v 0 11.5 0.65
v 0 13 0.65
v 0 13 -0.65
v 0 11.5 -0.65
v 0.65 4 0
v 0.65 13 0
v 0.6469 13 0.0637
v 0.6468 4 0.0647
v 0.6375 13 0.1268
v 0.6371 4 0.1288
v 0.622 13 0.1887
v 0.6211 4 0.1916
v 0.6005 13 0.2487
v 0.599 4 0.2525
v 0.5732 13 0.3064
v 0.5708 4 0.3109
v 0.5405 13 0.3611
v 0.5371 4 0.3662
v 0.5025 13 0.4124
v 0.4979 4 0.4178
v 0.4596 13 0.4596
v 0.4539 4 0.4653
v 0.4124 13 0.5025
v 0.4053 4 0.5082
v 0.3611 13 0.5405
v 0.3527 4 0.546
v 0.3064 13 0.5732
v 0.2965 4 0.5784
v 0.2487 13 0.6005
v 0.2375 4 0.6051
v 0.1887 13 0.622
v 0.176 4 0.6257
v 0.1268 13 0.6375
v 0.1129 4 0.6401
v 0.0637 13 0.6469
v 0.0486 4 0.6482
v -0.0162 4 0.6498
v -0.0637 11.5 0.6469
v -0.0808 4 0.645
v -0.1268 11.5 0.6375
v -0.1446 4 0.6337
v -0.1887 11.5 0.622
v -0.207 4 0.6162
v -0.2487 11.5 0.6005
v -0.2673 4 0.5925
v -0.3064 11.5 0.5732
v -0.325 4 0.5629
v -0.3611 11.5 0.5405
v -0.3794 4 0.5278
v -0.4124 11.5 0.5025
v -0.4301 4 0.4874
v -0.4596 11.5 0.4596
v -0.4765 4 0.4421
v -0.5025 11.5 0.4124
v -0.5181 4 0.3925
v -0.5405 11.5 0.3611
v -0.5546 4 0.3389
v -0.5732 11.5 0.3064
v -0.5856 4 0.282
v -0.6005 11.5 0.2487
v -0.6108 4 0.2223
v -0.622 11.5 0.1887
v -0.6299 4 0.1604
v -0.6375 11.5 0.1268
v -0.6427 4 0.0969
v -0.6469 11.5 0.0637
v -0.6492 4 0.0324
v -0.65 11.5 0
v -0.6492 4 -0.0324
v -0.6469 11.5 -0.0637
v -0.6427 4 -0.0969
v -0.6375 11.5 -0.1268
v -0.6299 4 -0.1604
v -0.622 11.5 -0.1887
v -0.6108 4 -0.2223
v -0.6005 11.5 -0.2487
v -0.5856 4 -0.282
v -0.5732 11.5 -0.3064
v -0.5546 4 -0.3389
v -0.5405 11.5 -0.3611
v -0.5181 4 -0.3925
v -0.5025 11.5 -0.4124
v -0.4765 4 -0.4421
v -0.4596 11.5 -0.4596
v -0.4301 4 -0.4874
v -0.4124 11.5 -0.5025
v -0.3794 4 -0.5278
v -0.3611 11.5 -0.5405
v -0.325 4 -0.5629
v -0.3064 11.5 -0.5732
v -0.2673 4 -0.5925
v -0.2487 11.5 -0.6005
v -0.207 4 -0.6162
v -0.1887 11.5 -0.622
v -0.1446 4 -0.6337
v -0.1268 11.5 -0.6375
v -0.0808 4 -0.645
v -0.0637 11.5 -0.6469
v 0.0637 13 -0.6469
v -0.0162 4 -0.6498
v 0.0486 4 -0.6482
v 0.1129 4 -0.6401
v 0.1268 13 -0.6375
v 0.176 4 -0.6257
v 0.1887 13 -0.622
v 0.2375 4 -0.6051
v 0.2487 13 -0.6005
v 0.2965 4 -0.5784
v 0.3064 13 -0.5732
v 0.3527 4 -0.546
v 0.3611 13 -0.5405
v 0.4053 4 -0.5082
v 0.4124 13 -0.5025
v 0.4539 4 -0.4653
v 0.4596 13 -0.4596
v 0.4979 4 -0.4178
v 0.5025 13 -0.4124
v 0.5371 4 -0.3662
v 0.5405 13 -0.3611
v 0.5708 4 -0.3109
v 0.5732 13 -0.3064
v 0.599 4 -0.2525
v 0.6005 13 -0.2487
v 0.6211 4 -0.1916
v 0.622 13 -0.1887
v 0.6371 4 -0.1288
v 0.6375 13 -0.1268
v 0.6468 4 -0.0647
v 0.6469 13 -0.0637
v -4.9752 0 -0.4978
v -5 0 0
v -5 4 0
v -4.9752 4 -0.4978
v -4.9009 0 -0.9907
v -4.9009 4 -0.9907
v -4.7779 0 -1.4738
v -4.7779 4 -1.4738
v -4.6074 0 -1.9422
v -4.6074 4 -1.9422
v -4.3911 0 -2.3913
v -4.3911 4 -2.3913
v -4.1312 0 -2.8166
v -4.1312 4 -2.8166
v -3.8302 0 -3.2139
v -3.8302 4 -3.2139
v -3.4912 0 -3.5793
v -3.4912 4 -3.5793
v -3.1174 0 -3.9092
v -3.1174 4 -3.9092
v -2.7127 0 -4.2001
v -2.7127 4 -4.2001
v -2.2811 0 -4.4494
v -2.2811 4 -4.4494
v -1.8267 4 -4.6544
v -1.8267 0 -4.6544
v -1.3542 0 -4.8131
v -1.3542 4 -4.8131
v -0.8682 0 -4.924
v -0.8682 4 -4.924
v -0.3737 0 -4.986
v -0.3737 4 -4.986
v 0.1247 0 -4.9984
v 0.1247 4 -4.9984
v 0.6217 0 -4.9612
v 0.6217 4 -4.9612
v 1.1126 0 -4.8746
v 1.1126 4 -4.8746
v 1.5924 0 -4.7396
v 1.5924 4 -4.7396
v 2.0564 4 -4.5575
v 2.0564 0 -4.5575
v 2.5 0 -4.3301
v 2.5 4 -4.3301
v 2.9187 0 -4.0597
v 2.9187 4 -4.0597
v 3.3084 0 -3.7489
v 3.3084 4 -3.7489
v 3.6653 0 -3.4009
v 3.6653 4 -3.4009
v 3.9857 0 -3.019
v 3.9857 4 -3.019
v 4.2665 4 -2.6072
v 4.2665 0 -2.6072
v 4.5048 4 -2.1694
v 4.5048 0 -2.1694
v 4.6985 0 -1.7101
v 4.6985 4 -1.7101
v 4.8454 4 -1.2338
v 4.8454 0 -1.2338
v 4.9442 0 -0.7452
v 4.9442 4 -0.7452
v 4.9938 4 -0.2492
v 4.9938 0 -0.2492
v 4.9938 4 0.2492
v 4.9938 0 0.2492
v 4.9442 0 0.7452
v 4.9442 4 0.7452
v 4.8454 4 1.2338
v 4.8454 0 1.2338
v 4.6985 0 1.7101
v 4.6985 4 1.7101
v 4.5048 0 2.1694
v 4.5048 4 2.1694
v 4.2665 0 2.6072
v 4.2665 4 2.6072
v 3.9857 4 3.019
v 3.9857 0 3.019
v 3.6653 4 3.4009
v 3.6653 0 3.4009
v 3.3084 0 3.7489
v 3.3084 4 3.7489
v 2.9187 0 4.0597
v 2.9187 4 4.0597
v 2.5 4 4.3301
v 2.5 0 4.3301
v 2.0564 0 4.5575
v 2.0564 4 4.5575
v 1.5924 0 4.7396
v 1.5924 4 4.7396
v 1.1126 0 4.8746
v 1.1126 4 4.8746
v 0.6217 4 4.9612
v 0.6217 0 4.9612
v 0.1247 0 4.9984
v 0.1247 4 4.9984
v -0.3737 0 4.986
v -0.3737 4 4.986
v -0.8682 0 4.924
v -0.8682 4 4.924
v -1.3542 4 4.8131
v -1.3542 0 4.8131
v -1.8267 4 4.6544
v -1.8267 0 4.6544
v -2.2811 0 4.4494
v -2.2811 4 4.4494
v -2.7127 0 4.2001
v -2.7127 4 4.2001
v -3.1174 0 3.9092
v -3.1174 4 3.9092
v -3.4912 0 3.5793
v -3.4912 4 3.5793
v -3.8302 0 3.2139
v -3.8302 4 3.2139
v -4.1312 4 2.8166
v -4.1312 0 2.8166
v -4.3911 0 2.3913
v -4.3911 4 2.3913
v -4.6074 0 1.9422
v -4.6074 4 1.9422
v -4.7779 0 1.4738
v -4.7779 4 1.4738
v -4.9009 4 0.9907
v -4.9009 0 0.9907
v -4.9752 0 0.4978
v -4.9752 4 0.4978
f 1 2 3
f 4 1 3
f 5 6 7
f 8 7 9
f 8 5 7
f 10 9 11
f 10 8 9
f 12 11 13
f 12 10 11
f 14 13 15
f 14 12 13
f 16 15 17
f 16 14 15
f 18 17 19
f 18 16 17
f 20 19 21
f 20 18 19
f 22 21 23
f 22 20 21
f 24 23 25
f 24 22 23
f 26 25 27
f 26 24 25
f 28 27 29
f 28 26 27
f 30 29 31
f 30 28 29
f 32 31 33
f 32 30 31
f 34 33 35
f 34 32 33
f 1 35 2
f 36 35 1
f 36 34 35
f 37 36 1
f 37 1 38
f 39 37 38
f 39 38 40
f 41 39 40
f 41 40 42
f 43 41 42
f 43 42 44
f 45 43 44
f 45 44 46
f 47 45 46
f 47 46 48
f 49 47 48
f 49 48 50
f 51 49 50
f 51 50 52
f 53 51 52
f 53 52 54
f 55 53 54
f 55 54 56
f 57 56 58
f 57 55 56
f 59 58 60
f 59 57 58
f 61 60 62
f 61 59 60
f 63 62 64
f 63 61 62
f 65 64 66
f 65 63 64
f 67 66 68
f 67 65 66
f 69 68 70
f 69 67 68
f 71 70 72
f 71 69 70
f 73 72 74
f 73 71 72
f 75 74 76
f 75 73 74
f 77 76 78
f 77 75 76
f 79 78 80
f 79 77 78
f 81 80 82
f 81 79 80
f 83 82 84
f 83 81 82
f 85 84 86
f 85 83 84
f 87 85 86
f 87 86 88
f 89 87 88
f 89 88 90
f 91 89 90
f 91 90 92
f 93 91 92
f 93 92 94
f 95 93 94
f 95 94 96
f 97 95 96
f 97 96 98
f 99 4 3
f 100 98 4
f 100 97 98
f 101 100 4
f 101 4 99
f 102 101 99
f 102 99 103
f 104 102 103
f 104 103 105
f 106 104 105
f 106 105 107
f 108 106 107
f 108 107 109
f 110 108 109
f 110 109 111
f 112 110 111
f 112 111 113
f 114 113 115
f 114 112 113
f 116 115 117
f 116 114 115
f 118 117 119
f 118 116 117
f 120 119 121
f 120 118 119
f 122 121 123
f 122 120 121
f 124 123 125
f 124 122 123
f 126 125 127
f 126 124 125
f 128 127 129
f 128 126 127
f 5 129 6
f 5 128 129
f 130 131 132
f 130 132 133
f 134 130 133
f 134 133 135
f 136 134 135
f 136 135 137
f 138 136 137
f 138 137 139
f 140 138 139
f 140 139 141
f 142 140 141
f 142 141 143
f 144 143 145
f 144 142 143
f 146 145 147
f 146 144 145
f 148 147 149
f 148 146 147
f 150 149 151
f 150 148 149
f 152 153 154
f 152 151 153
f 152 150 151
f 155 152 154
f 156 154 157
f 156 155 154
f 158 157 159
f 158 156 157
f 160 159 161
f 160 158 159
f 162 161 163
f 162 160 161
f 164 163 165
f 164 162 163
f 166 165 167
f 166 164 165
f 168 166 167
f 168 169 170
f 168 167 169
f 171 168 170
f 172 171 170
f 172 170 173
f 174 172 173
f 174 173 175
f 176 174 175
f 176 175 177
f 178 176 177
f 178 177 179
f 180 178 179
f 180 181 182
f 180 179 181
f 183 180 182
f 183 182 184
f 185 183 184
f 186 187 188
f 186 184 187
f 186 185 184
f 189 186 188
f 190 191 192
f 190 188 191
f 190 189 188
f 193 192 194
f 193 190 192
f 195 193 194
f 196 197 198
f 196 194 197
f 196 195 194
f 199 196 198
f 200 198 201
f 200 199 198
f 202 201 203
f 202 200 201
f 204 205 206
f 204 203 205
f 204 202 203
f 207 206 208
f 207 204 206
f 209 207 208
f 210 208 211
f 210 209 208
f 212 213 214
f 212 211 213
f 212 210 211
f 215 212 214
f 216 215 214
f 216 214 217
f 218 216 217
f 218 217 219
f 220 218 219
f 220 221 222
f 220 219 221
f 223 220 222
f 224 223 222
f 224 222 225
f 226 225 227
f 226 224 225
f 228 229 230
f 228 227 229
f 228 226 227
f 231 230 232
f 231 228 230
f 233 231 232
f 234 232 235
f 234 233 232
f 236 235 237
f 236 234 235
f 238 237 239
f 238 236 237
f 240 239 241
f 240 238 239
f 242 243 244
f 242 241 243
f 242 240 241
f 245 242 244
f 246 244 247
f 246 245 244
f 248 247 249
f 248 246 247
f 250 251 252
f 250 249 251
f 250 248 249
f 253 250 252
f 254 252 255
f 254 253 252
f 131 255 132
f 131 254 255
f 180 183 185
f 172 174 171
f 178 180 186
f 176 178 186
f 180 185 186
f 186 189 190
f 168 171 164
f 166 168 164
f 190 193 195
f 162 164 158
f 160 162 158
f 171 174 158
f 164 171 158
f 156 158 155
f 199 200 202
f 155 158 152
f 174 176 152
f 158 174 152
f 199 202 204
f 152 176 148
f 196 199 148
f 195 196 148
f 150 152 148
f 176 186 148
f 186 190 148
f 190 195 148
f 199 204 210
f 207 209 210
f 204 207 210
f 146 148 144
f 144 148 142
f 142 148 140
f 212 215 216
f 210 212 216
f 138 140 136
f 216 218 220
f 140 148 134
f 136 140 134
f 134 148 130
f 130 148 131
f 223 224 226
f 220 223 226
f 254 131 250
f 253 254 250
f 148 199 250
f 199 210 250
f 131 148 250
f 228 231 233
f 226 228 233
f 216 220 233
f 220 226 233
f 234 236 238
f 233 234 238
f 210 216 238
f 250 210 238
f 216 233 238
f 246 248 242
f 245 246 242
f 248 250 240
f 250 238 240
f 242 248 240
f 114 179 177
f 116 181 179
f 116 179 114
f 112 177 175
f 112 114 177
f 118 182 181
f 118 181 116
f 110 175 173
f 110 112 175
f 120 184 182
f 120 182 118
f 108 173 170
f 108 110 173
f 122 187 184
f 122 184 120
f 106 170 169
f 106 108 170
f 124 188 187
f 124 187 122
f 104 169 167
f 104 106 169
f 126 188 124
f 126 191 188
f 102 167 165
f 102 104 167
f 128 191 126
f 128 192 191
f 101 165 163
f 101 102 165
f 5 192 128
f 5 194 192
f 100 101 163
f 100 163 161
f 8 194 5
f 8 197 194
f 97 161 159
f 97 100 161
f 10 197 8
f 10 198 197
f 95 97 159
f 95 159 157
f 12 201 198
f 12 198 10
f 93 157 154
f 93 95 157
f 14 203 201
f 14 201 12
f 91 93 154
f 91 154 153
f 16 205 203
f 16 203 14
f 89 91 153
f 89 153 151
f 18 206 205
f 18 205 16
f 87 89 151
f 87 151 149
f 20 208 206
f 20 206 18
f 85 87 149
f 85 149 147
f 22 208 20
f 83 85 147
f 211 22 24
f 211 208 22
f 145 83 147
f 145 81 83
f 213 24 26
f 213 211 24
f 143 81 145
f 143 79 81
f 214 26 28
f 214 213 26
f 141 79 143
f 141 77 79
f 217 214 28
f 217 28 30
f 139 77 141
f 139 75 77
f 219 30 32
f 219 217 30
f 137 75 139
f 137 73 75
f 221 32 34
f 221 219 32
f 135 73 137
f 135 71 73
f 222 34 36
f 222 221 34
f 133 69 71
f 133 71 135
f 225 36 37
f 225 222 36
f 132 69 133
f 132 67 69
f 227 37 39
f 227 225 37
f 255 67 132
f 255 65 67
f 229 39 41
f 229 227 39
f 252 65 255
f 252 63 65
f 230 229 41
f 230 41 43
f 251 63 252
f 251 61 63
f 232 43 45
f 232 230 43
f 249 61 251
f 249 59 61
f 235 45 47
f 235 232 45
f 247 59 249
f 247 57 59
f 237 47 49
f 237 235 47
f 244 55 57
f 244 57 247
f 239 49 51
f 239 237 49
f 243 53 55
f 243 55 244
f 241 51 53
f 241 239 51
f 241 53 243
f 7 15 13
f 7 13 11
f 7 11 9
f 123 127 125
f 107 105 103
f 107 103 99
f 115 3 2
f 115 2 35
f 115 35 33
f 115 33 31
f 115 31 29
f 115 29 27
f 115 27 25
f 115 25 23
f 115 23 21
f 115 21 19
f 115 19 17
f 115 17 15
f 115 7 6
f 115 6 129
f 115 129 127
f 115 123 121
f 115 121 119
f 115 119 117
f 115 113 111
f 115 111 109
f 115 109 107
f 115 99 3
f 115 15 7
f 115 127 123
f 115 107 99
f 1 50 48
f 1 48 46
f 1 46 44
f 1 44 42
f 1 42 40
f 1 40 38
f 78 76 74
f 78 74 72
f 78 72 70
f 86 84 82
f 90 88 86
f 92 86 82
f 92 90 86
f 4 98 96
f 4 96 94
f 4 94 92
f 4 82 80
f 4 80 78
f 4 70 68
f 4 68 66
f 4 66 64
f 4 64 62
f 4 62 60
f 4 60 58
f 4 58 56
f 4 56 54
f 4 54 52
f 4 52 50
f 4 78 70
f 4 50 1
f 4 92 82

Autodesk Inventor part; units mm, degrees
ref_plane "YZ Plane" through (0, 0, 0) normal (1, 0, 0) x (0, 1, 0)
ref_plane "XZ Plane" through (0, 0, 0) normal (0, 1, 0) x (-1, 0, 0)
ref_plane "XY Plane" through (0, 0, 0) normal (0, 0, 1) x (1, 0, 0)
sketch "Boceto1" plane through (0, 0, 0) normal (0, 1, 0) x (-1, 0, 0)
  circle A0 centre (0, 0) radius 5
  dimension "d0" = 10
extrude "Extrusión1" add sketch "Boceto1" along normal blind 4
sketch "Boceto2" plane through (0, 4, 0) normal (0, 1, 0) x (1, 0, 0)
  circle A0 centre (0, 0) radius 0.65
  dimension "d3" = 1.3
extrude "Extrusión2" add sketch "Boceto2" along normal blind 9
sketch "Boceto3" plane through (0, 13, 0) normal (0, 1, 0) x (1, 0, 0)
  circle A0 centre (0, 0) radius 0.65 projected
  line L0 (0, -0.65) -> (0, 0.65)
  circle A1 centre (0, 0) radius 0.65 projected
extrude "Extrusión3" cut sketch "Boceto3" against normal blind 1.5 contours L0 A0 picked at (-0.0519, -0.2104)
properties part number "ServoPot"
